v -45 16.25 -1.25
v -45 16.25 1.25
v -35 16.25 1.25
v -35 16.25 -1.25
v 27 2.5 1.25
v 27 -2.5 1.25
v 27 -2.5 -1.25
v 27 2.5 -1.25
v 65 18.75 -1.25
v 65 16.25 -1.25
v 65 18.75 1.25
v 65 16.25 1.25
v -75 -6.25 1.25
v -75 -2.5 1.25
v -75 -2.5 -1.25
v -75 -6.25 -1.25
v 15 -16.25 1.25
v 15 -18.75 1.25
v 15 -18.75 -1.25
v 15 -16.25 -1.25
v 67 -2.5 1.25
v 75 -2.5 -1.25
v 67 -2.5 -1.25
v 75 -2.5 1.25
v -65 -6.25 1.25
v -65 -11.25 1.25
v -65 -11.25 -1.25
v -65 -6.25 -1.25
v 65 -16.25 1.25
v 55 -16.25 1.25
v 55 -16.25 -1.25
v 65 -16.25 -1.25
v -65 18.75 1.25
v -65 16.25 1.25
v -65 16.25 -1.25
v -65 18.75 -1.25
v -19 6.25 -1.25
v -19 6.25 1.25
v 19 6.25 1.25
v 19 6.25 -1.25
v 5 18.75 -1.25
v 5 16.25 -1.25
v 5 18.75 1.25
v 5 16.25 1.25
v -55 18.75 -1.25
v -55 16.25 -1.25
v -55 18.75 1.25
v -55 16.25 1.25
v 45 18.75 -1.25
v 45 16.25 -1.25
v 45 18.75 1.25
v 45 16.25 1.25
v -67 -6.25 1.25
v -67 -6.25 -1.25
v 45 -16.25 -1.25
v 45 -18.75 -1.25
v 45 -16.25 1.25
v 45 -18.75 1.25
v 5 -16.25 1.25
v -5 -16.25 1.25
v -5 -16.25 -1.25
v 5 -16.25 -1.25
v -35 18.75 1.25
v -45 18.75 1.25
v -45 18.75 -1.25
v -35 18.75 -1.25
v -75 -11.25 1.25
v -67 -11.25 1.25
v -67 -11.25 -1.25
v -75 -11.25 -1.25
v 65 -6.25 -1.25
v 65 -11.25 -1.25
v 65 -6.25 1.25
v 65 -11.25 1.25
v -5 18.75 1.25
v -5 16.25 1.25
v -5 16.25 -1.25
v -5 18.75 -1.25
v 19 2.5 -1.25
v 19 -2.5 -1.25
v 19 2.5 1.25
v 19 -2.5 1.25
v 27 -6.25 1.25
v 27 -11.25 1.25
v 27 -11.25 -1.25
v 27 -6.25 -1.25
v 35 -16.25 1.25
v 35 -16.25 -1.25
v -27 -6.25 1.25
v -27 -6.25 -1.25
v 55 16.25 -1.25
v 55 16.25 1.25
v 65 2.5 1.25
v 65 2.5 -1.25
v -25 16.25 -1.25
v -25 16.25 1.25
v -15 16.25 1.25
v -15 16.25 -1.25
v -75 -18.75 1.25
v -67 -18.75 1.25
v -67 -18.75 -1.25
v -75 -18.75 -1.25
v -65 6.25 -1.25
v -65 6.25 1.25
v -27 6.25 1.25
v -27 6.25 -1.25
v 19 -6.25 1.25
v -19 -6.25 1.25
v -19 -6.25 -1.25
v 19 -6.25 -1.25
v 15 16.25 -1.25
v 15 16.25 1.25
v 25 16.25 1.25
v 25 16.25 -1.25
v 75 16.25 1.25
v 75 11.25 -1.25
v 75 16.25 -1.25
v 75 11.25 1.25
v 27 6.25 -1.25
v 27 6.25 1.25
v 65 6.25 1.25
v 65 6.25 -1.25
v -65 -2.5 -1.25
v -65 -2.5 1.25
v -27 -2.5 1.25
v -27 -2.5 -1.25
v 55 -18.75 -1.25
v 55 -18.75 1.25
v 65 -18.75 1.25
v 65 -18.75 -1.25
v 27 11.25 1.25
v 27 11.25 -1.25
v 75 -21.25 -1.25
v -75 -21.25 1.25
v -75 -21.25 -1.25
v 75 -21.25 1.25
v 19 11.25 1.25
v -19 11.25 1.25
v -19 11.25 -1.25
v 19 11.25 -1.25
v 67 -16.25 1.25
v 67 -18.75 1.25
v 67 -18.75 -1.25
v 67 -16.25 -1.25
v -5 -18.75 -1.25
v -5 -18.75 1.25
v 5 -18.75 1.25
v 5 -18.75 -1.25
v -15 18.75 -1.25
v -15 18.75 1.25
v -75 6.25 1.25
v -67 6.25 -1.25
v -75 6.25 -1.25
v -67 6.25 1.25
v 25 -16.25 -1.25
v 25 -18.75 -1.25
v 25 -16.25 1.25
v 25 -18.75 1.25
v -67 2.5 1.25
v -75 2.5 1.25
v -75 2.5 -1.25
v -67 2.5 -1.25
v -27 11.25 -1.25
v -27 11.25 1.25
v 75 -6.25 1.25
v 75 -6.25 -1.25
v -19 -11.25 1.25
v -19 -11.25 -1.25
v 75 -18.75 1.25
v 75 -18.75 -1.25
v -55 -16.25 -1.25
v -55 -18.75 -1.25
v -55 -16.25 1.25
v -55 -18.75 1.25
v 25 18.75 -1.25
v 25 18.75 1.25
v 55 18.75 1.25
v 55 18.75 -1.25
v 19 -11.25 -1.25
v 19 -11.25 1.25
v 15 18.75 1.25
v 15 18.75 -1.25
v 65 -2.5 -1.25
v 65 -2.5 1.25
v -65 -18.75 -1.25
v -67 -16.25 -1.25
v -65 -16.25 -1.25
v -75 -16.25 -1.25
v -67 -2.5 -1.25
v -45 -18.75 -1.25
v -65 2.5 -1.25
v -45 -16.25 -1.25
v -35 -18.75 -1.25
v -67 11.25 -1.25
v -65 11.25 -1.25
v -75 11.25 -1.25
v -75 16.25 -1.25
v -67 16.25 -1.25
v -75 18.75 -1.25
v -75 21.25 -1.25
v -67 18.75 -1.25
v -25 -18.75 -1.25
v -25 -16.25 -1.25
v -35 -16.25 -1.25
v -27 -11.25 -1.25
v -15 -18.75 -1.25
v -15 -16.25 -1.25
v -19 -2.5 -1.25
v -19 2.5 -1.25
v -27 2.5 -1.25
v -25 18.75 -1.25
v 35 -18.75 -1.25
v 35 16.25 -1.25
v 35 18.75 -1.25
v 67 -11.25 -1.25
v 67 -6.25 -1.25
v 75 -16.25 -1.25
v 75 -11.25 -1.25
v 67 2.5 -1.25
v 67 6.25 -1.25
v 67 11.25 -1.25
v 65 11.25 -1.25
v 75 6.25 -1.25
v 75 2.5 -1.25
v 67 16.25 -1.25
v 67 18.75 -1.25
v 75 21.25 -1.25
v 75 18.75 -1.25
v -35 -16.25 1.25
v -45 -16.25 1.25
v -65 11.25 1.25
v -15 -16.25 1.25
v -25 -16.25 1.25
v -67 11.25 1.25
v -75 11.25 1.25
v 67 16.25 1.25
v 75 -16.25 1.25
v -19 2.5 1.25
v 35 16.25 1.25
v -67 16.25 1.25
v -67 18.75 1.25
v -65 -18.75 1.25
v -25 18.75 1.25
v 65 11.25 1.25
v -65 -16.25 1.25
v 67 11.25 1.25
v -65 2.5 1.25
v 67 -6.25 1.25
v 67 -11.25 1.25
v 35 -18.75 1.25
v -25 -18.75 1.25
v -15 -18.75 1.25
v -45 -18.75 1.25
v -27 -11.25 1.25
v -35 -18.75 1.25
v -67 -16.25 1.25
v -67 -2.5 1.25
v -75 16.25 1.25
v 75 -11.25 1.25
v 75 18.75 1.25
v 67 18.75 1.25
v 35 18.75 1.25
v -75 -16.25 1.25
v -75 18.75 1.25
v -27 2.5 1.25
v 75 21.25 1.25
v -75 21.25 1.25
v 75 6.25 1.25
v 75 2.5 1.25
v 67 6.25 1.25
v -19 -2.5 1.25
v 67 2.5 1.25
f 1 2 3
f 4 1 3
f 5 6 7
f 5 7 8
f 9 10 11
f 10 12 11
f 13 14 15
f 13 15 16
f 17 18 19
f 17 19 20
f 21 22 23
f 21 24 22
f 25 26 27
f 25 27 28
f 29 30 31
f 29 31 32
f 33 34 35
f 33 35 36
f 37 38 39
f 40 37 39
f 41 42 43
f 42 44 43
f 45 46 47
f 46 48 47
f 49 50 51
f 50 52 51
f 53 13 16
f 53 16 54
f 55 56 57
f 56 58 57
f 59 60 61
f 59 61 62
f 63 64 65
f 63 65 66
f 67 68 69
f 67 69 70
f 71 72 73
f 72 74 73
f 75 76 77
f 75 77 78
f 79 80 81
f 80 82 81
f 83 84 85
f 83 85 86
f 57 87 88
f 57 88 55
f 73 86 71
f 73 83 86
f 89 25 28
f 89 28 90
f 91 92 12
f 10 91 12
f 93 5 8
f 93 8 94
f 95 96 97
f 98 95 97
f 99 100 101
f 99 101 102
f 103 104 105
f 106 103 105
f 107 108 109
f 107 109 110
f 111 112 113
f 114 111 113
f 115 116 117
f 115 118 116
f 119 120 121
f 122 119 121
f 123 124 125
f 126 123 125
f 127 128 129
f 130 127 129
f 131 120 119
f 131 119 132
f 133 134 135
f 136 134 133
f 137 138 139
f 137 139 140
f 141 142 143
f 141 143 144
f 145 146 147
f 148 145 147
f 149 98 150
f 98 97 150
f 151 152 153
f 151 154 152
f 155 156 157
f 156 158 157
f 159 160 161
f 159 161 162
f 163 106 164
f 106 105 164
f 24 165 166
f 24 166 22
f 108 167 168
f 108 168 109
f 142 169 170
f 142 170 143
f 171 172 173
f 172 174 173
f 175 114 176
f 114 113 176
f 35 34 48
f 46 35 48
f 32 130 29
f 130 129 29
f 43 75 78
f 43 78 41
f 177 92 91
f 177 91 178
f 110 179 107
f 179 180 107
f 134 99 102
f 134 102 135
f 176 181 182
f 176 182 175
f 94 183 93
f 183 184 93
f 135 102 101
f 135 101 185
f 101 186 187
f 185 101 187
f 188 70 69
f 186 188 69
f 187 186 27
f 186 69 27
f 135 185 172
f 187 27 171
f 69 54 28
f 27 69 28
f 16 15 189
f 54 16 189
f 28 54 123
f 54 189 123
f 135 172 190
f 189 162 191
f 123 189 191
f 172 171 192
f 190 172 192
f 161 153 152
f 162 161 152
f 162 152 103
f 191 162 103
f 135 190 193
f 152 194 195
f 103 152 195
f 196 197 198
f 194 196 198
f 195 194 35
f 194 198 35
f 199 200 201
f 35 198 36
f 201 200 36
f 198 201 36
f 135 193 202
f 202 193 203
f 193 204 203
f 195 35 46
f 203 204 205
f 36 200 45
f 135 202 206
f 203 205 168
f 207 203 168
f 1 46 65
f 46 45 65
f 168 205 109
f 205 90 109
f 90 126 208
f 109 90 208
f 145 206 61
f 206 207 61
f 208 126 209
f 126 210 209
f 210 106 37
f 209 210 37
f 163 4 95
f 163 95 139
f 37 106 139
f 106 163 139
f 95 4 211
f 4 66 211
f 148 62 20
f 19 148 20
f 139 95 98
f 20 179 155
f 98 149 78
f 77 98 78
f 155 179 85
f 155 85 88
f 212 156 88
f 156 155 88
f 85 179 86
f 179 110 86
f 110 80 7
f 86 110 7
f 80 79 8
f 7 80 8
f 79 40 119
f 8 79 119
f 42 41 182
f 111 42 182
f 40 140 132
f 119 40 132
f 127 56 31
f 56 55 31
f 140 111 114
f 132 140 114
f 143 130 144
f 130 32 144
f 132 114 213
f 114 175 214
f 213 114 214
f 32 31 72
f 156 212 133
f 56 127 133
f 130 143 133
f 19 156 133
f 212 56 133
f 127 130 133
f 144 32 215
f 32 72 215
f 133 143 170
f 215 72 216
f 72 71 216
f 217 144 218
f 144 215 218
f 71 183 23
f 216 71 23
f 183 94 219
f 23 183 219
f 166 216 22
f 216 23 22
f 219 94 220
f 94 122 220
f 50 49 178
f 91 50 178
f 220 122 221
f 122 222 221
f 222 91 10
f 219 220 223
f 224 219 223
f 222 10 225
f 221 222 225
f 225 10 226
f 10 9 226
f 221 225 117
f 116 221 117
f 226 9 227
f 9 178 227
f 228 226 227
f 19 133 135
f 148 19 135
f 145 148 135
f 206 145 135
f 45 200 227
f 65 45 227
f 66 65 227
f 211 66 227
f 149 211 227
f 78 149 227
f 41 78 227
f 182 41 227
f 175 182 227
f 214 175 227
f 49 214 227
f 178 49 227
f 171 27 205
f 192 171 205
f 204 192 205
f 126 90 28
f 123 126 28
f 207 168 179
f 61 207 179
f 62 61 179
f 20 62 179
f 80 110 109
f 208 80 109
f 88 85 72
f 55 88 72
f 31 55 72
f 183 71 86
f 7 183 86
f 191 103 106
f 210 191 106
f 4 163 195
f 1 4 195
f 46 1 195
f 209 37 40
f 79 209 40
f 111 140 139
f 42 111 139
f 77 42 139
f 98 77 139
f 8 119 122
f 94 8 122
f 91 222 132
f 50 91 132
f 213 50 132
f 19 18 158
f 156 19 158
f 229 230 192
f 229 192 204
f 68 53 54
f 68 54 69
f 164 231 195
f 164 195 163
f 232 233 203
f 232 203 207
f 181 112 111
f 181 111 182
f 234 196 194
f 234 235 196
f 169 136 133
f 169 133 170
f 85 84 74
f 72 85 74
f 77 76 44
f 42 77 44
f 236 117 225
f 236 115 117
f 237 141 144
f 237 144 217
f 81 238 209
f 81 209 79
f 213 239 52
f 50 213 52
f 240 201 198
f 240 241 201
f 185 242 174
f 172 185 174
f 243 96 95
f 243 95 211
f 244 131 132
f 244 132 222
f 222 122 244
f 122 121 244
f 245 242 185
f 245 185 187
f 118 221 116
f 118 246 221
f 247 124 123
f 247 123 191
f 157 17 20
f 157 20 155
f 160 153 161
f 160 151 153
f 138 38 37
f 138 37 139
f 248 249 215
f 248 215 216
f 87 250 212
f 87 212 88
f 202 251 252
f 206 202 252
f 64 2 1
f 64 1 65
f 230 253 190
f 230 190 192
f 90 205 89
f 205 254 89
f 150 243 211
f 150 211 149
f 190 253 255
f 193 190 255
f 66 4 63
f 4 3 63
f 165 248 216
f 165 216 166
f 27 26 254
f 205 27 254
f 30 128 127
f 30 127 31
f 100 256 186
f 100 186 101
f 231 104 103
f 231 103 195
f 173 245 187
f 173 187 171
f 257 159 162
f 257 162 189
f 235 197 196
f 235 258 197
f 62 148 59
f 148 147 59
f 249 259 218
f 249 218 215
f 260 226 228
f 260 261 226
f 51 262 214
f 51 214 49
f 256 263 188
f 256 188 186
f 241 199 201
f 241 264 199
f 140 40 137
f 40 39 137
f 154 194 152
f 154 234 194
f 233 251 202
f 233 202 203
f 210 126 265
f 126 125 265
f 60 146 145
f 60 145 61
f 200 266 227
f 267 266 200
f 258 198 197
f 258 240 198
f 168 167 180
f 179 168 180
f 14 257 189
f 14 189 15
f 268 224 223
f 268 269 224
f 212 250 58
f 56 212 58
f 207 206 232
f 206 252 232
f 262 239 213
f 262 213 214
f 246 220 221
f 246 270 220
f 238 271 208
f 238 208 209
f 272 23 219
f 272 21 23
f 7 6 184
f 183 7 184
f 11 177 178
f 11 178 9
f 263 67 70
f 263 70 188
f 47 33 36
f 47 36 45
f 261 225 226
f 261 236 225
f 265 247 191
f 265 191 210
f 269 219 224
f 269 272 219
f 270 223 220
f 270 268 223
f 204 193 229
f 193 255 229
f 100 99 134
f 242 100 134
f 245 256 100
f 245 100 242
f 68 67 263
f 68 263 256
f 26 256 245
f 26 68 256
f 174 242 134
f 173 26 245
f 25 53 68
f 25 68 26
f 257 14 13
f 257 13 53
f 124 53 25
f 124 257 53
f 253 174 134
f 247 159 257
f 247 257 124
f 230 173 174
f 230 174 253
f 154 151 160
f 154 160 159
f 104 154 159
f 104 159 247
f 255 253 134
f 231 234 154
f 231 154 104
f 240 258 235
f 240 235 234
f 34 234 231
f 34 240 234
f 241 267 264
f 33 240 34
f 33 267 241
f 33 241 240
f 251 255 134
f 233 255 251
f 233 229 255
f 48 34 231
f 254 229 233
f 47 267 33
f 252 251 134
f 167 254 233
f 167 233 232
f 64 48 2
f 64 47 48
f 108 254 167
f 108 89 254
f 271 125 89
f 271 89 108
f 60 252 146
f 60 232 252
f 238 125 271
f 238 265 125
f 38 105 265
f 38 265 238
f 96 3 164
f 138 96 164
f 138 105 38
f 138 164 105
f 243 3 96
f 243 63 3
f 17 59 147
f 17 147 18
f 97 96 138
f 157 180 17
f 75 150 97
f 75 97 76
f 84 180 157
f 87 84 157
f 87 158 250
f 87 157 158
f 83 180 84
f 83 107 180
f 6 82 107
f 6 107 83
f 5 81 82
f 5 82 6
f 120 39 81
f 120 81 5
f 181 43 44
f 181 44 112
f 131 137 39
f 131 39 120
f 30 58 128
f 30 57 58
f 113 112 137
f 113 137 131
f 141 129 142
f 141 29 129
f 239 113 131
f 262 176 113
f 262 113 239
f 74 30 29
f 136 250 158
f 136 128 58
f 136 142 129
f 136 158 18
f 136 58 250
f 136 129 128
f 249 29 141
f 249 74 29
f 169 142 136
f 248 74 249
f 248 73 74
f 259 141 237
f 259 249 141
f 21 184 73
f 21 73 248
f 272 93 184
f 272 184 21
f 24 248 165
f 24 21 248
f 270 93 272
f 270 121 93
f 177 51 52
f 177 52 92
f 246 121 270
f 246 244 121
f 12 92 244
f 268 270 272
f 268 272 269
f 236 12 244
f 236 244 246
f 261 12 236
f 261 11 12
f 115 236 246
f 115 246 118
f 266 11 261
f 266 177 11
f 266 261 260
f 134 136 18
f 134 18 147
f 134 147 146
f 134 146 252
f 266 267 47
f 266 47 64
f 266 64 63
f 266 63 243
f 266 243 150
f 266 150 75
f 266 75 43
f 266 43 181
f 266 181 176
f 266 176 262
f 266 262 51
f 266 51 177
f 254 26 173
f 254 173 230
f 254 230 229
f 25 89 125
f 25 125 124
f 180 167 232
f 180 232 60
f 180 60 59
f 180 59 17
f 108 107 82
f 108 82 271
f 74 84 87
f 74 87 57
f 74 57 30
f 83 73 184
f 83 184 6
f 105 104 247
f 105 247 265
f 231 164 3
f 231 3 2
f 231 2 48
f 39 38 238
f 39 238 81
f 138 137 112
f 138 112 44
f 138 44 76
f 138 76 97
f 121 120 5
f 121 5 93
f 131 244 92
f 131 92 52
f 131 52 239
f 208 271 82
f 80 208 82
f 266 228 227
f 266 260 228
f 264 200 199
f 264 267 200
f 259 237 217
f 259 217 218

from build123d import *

# Parameters (mm, degrees)
SKETCH1_W           = 38
SKETCH1_H           = 5
SKETCH1_W_2         = 10
SKETCH1_H_2         = 2.5
BOSS_EXTRUDE1_DEPTH = 1.25


with BuildPart() as part:
    # Sketch1 → Boss-Extrude1 (new, symmetric)
    with BuildSketch(Plane.XY):
        Polygon((-75, 6.25), (-75, 2.5), (-67, 2.5), (-67, -2.5), (-75, -2.5), (-75, -6.25), (-67, -6.25), (-67, -11.25), (-75, -11.25), (-75, -16.25), (-67, -16.25), (-67, -18.75), (-75, -18.75), (-75, -21.25), (75, -21.25), (75, -18.75), (67, -18.75), (67, -16.25), (75, -16.25), (75, -11.25), (67, -11.25), (67, -6.25), (75, -6.25), (75, -2.5), (67, -2.5), (67, 2.5), (75, 2.5), (75, 6.25), (67, 6.25), (67, 11.25), (75, 11.25), (75, 16.25), (67, 16.25), (67, 18.75), (75, 18.75), (75, 21.25), (-75, 21.25), (-75, 18.75), (-67, 18.75), (-67, 16.25), (-75, 16.25), (-75, 11.25), (-67, 11.25), (-67, 6.25), align=None)
        with Locations((0, 8.75)):
            Rectangle(SKETCH1_W, SKETCH1_H, mode=Mode.SUBTRACT)
        Rectangle(SKETCH1_W, SKETCH1_H, mode=Mode.SUBTRACT)
        with Locations((0, -17.5)):
            Rectangle(SKETCH1_W_2, SKETCH1_H_2, mode=Mode.SUBTRACT)
        with Locations((0, 17.5)):
            Rectangle(SKETCH1_W_2, SKETCH1_H_2, mode=Mode.SUBTRACT)
        with Locations((20, 17.5)):
            Rectangle(SKETCH1_W_2, SKETCH1_H_2, mode=Mode.SUBTRACT)
        with Locations((20, -17.5)):
            Rectangle(SKETCH1_W_2, SKETCH1_H_2, mode=Mode.SUBTRACT)
        with Locations((40, 17.5)):
            Rectangle(SKETCH1_W_2, SKETCH1_H_2, mode=Mode.SUBTRACT)
        with Locations((40, -17.5)):
            Rectangle(SKETCH1_W_2, SKETCH1_H_2, mode=Mode.SUBTRACT)
        with Locations((60, 17.5)):
            Rectangle(SKETCH1_W_2, SKETCH1_H_2, mode=Mode.SUBTRACT)
        with Locations((60, -17.5)):
            Rectangle(SKETCH1_W_2, SKETCH1_H_2, mode=Mode.SUBTRACT)
        with Locations((-20, -17.5)):
            Rectangle(SKETCH1_W_2, SKETCH1_H_2, mode=Mode.SUBTRACT)
        with Locations((-20, 17.5)):
            Rectangle(SKETCH1_W_2, SKETCH1_H_2, mode=Mode.SUBTRACT)
        with Locations((-40, -17.5)):
            Rectangle(SKETCH1_W_2, SKETCH1_H_2, mode=Mode.SUBTRACT)
        with Locations((-40, 17.5)):
            Rectangle(SKETCH1_W_2, SKETCH1_H_2, mode=Mode.SUBTRACT)
        with Locations((-60, -17.5)):
            Rectangle(SKETCH1_W_2, SKETCH1_H_2, mode=Mode.SUBTRACT)
        with Locations((-60, 17.5)):
            Rectangle(SKETCH1_W_2, SKETCH1_H_2, mode=Mode.SUBTRACT)
        with Locations((0, -8.75)):
            Rectangle(SKETCH1_W, SKETCH1_H, mode=Mode.SUBTRACT)
        with Locations((-46, 0)):
            Rectangle(SKETCH1_W, SKETCH1_H, mode=Mode.SUBTRACT)
        with Locations((-46, 8.75)):
            Rectangle(SKETCH1_W, SKETCH1_H, mode=Mode.SUBTRACT)
        with Locations((-46, -8.75)):
            Rectangle(SKETCH1_W, SKETCH1_H, mode=Mode.SUBTRACT)
        with Locations((46, 8.75)):
            Rectangle(SKETCH1_W, SKETCH1_H, mode=Mode.SUBTRACT)
        with Locations((46, 0)):
            Rectangle(SKETCH1_W, SKETCH1_H, mode=Mode.SUBTRACT)
        with Locations((46, -8.75)):
            Rectangle(SKETCH1_W, SKETCH1_H, mode=Mode.SUBTRACT)
    extrude(amount=BOSS_EXTRUDE1_DEPTH, both=True)


solid = part.part
